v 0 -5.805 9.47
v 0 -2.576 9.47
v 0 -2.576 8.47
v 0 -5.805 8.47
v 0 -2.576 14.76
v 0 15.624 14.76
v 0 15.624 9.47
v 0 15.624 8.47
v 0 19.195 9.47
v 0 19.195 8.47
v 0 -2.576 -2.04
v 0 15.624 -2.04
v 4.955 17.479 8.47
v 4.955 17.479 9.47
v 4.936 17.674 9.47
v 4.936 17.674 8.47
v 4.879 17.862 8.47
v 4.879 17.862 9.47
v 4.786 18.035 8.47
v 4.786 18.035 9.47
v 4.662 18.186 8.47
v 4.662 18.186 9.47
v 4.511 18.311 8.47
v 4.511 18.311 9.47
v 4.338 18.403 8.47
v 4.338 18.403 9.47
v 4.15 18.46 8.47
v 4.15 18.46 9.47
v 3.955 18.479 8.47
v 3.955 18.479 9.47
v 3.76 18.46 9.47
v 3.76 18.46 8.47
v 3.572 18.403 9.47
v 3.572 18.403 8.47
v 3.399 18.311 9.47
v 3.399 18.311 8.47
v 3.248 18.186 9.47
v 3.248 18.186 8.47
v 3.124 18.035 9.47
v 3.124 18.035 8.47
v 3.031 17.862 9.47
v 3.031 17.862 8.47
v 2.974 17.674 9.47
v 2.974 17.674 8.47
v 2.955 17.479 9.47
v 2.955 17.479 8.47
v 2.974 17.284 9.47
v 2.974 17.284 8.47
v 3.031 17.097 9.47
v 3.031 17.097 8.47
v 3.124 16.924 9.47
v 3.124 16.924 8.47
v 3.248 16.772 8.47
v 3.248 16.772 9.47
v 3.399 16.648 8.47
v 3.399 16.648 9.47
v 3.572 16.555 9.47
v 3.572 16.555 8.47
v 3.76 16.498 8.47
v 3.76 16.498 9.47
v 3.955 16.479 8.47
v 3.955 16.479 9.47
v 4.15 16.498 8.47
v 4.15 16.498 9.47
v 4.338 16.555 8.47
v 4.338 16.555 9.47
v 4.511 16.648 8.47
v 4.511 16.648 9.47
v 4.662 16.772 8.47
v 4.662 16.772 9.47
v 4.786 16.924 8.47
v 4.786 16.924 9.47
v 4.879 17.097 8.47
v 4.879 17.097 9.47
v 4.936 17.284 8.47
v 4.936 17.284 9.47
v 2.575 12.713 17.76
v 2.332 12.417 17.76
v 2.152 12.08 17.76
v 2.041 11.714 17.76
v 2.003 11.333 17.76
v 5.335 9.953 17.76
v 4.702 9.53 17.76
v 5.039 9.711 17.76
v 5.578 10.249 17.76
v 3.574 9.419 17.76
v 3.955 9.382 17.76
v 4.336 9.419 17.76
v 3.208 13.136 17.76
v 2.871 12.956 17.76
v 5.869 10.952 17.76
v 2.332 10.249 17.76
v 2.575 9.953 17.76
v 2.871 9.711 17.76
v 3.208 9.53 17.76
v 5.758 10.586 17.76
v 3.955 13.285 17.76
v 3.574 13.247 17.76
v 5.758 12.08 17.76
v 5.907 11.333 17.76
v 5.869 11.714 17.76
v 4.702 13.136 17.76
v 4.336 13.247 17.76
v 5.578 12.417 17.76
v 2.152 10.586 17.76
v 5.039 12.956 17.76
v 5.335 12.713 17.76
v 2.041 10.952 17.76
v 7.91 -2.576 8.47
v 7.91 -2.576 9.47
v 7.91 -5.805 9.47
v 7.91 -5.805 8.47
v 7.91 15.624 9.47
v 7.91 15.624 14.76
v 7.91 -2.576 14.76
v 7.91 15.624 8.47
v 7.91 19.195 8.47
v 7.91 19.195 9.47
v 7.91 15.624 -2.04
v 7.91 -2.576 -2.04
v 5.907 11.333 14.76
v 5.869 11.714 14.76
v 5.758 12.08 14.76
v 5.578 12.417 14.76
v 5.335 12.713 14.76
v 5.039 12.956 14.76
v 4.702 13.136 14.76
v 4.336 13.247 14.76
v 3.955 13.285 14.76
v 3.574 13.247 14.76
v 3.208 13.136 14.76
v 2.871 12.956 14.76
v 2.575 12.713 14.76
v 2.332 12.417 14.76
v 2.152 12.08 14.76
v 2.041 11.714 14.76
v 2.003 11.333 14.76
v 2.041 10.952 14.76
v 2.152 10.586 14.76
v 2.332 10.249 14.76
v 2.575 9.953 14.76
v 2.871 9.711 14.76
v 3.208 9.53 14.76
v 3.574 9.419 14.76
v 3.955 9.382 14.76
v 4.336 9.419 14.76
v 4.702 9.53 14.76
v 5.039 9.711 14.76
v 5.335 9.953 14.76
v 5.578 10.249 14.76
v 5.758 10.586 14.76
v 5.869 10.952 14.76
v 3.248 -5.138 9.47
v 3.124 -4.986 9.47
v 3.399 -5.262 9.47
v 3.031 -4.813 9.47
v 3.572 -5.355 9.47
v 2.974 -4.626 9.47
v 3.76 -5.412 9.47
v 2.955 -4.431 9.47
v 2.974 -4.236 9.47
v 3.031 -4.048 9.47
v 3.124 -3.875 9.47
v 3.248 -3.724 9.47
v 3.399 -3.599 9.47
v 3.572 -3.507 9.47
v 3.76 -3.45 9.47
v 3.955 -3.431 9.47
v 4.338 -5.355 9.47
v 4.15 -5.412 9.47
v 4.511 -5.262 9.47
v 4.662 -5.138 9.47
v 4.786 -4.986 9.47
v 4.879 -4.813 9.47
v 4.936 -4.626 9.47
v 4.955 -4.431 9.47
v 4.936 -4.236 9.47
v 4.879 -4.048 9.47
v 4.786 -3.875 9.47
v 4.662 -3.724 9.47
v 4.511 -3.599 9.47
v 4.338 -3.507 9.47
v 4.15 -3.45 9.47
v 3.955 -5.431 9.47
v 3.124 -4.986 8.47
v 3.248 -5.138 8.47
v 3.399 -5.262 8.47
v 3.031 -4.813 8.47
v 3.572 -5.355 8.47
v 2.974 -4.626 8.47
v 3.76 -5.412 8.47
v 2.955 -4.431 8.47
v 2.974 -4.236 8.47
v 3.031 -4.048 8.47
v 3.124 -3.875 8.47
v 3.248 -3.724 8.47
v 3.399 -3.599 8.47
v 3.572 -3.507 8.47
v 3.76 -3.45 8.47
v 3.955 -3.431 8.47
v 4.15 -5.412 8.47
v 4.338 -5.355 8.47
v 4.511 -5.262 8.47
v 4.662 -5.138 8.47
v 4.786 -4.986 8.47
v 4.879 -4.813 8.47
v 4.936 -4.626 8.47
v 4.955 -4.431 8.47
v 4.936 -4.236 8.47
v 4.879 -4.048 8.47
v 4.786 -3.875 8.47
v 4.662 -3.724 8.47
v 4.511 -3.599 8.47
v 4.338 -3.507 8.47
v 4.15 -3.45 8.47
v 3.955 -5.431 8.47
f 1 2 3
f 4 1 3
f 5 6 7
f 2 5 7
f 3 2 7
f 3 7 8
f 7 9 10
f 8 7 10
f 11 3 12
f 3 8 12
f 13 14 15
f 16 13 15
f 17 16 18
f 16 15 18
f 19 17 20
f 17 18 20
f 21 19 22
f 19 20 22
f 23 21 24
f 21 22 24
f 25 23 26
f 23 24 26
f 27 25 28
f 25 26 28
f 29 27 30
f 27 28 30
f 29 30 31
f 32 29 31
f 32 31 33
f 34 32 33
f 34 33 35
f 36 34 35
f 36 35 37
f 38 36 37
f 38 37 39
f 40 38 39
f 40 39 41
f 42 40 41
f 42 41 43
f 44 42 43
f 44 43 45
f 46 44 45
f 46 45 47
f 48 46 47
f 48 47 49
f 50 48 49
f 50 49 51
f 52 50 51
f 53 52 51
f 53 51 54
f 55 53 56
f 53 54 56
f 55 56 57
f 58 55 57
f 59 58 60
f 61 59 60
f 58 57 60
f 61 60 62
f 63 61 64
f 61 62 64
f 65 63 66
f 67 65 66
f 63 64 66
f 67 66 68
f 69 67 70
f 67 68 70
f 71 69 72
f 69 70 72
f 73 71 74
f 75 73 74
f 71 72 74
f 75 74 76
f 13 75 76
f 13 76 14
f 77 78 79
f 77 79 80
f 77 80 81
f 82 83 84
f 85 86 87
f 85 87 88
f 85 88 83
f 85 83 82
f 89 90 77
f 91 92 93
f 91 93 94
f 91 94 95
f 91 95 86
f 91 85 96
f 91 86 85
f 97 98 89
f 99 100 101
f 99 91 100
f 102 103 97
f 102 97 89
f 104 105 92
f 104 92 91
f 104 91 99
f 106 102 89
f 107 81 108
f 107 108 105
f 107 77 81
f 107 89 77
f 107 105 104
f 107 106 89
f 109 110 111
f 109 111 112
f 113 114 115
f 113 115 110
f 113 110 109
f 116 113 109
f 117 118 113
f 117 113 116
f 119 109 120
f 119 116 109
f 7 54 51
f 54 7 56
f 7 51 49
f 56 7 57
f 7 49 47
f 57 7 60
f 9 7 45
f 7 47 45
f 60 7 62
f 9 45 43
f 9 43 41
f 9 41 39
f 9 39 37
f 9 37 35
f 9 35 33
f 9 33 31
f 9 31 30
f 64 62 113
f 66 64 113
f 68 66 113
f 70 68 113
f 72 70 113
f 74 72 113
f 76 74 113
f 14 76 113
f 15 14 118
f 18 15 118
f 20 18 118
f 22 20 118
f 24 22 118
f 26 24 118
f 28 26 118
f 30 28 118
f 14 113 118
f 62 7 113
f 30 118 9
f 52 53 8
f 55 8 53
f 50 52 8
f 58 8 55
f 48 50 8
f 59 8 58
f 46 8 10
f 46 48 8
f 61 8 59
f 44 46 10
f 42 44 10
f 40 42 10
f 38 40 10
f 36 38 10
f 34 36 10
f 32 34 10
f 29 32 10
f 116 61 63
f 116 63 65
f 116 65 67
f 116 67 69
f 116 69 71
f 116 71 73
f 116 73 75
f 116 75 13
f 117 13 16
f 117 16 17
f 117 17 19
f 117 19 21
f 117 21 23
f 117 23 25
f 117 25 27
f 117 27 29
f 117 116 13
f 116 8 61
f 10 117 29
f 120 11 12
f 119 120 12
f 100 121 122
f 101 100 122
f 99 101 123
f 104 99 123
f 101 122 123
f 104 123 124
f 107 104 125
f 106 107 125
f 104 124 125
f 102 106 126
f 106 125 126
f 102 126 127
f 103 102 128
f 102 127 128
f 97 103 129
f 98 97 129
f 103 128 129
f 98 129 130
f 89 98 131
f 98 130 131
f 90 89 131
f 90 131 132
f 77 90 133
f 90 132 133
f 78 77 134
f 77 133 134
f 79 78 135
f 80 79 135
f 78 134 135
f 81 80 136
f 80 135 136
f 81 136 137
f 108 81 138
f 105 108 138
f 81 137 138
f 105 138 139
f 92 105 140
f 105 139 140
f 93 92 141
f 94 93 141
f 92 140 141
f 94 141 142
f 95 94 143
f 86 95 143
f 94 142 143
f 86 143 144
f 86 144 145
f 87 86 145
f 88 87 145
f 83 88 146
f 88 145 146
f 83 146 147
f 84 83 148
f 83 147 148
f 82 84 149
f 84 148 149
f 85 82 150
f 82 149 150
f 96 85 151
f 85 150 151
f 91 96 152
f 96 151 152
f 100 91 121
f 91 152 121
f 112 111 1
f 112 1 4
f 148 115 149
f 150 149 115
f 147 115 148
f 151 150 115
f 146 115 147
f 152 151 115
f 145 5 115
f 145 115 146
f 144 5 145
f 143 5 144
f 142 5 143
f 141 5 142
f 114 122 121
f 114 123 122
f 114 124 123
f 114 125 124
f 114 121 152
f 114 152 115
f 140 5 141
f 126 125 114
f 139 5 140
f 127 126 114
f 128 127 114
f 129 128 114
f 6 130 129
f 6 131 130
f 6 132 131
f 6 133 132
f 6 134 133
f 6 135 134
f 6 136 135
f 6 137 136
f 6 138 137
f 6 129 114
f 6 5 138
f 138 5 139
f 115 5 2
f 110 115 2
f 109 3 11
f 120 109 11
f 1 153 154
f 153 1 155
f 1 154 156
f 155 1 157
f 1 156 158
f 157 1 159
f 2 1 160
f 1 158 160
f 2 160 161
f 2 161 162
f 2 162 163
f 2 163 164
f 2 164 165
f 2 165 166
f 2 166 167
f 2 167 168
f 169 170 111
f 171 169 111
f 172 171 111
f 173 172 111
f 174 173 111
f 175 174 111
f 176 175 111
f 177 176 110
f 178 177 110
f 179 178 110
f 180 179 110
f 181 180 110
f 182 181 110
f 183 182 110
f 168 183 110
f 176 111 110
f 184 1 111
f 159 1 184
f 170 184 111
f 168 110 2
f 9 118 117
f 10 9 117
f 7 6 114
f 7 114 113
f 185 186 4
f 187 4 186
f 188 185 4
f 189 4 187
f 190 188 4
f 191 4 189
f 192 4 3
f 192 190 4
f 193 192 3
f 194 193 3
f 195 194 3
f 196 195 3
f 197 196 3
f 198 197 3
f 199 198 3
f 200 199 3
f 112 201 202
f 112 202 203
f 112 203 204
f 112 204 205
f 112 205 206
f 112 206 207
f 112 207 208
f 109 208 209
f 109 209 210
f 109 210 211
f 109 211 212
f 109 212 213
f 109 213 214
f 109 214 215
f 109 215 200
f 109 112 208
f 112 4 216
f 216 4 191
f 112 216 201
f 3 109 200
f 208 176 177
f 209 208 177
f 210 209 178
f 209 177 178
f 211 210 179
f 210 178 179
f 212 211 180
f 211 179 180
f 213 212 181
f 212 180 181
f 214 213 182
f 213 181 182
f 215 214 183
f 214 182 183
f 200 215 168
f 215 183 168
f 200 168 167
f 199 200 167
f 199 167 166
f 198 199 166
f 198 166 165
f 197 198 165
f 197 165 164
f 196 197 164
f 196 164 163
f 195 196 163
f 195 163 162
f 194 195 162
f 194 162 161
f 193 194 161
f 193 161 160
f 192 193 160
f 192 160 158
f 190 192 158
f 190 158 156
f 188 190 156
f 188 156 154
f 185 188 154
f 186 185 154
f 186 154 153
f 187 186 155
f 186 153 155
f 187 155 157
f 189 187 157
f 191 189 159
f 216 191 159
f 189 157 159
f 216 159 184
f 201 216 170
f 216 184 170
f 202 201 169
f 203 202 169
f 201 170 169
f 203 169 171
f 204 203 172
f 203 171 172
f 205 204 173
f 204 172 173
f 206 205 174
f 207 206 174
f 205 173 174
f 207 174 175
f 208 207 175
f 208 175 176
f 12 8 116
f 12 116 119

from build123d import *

# Parameters (mm, degrees)
SKETCH1_W           = 16.8
SKETCH1_H           = 18.2
BOSS_EXTRUDE1_DEPTH = 7.91
SKETCH2_W           = 1
SKETCH2_H           = 25
BOSS_EXTRUDE2_DEPTH = 7.91
SKETCH3_R           = 1
CUT_EXTRUDE1_DEPTH  = 21.9
SKETCH4_R           = 1.951580775
BOSS_EXTRUDE3_DEPTH = 3


with BuildPart() as part:
    # Sketch1 → Boss-Extrude1 (new body)
    with BuildSketch(Plane(origin=(0, 0, 0), x_dir=(0, 0, -1), z_dir=(1, 0, 0))):
        with Locations((-6.360008023, 6.524197801)):
            Rectangle(SKETCH1_W, SKETCH1_H)
    extrude(amount=BOSS_EXTRUDE1_DEPTH)

    # Sketch2 → Boss-Extrude2 (add)
    with BuildSketch(Plane(origin=(7.91, 0, 0), x_dir=(0, 0, -1), z_dir=(1, 0, 0))):
        with Locations((-8.970008023, 6.694520813)):
            Rectangle(SKETCH2_W, SKETCH2_H)
    extrude(amount=-BOSS_EXTRUDE2_DEPTH)

    # Sketch3 → Cut-Extrude1 (cut)
    with BuildSketch(Plane.XY.offset(9.470008023)):
        with Locations((3.955, 17.479197801)):
            Circle(SKETCH3_R)
        with Locations((3.955, -4.430802199)):
            Circle(SKETCH3_R)
    extrude(amount=-CUT_EXTRUDE1_DEPTH, mode=Mode.SUBTRACT)

    # Sketch4 → Boss-Extrude3 (add)
    with BuildSketch(Plane.XY.offset(14.760008023)):
        with Locations((3.955, 11.333194866)):
            Circle(SKETCH4_R)
    extrude(amount=BOSS_EXTRUDE3_DEPTH)


solid = part.part
